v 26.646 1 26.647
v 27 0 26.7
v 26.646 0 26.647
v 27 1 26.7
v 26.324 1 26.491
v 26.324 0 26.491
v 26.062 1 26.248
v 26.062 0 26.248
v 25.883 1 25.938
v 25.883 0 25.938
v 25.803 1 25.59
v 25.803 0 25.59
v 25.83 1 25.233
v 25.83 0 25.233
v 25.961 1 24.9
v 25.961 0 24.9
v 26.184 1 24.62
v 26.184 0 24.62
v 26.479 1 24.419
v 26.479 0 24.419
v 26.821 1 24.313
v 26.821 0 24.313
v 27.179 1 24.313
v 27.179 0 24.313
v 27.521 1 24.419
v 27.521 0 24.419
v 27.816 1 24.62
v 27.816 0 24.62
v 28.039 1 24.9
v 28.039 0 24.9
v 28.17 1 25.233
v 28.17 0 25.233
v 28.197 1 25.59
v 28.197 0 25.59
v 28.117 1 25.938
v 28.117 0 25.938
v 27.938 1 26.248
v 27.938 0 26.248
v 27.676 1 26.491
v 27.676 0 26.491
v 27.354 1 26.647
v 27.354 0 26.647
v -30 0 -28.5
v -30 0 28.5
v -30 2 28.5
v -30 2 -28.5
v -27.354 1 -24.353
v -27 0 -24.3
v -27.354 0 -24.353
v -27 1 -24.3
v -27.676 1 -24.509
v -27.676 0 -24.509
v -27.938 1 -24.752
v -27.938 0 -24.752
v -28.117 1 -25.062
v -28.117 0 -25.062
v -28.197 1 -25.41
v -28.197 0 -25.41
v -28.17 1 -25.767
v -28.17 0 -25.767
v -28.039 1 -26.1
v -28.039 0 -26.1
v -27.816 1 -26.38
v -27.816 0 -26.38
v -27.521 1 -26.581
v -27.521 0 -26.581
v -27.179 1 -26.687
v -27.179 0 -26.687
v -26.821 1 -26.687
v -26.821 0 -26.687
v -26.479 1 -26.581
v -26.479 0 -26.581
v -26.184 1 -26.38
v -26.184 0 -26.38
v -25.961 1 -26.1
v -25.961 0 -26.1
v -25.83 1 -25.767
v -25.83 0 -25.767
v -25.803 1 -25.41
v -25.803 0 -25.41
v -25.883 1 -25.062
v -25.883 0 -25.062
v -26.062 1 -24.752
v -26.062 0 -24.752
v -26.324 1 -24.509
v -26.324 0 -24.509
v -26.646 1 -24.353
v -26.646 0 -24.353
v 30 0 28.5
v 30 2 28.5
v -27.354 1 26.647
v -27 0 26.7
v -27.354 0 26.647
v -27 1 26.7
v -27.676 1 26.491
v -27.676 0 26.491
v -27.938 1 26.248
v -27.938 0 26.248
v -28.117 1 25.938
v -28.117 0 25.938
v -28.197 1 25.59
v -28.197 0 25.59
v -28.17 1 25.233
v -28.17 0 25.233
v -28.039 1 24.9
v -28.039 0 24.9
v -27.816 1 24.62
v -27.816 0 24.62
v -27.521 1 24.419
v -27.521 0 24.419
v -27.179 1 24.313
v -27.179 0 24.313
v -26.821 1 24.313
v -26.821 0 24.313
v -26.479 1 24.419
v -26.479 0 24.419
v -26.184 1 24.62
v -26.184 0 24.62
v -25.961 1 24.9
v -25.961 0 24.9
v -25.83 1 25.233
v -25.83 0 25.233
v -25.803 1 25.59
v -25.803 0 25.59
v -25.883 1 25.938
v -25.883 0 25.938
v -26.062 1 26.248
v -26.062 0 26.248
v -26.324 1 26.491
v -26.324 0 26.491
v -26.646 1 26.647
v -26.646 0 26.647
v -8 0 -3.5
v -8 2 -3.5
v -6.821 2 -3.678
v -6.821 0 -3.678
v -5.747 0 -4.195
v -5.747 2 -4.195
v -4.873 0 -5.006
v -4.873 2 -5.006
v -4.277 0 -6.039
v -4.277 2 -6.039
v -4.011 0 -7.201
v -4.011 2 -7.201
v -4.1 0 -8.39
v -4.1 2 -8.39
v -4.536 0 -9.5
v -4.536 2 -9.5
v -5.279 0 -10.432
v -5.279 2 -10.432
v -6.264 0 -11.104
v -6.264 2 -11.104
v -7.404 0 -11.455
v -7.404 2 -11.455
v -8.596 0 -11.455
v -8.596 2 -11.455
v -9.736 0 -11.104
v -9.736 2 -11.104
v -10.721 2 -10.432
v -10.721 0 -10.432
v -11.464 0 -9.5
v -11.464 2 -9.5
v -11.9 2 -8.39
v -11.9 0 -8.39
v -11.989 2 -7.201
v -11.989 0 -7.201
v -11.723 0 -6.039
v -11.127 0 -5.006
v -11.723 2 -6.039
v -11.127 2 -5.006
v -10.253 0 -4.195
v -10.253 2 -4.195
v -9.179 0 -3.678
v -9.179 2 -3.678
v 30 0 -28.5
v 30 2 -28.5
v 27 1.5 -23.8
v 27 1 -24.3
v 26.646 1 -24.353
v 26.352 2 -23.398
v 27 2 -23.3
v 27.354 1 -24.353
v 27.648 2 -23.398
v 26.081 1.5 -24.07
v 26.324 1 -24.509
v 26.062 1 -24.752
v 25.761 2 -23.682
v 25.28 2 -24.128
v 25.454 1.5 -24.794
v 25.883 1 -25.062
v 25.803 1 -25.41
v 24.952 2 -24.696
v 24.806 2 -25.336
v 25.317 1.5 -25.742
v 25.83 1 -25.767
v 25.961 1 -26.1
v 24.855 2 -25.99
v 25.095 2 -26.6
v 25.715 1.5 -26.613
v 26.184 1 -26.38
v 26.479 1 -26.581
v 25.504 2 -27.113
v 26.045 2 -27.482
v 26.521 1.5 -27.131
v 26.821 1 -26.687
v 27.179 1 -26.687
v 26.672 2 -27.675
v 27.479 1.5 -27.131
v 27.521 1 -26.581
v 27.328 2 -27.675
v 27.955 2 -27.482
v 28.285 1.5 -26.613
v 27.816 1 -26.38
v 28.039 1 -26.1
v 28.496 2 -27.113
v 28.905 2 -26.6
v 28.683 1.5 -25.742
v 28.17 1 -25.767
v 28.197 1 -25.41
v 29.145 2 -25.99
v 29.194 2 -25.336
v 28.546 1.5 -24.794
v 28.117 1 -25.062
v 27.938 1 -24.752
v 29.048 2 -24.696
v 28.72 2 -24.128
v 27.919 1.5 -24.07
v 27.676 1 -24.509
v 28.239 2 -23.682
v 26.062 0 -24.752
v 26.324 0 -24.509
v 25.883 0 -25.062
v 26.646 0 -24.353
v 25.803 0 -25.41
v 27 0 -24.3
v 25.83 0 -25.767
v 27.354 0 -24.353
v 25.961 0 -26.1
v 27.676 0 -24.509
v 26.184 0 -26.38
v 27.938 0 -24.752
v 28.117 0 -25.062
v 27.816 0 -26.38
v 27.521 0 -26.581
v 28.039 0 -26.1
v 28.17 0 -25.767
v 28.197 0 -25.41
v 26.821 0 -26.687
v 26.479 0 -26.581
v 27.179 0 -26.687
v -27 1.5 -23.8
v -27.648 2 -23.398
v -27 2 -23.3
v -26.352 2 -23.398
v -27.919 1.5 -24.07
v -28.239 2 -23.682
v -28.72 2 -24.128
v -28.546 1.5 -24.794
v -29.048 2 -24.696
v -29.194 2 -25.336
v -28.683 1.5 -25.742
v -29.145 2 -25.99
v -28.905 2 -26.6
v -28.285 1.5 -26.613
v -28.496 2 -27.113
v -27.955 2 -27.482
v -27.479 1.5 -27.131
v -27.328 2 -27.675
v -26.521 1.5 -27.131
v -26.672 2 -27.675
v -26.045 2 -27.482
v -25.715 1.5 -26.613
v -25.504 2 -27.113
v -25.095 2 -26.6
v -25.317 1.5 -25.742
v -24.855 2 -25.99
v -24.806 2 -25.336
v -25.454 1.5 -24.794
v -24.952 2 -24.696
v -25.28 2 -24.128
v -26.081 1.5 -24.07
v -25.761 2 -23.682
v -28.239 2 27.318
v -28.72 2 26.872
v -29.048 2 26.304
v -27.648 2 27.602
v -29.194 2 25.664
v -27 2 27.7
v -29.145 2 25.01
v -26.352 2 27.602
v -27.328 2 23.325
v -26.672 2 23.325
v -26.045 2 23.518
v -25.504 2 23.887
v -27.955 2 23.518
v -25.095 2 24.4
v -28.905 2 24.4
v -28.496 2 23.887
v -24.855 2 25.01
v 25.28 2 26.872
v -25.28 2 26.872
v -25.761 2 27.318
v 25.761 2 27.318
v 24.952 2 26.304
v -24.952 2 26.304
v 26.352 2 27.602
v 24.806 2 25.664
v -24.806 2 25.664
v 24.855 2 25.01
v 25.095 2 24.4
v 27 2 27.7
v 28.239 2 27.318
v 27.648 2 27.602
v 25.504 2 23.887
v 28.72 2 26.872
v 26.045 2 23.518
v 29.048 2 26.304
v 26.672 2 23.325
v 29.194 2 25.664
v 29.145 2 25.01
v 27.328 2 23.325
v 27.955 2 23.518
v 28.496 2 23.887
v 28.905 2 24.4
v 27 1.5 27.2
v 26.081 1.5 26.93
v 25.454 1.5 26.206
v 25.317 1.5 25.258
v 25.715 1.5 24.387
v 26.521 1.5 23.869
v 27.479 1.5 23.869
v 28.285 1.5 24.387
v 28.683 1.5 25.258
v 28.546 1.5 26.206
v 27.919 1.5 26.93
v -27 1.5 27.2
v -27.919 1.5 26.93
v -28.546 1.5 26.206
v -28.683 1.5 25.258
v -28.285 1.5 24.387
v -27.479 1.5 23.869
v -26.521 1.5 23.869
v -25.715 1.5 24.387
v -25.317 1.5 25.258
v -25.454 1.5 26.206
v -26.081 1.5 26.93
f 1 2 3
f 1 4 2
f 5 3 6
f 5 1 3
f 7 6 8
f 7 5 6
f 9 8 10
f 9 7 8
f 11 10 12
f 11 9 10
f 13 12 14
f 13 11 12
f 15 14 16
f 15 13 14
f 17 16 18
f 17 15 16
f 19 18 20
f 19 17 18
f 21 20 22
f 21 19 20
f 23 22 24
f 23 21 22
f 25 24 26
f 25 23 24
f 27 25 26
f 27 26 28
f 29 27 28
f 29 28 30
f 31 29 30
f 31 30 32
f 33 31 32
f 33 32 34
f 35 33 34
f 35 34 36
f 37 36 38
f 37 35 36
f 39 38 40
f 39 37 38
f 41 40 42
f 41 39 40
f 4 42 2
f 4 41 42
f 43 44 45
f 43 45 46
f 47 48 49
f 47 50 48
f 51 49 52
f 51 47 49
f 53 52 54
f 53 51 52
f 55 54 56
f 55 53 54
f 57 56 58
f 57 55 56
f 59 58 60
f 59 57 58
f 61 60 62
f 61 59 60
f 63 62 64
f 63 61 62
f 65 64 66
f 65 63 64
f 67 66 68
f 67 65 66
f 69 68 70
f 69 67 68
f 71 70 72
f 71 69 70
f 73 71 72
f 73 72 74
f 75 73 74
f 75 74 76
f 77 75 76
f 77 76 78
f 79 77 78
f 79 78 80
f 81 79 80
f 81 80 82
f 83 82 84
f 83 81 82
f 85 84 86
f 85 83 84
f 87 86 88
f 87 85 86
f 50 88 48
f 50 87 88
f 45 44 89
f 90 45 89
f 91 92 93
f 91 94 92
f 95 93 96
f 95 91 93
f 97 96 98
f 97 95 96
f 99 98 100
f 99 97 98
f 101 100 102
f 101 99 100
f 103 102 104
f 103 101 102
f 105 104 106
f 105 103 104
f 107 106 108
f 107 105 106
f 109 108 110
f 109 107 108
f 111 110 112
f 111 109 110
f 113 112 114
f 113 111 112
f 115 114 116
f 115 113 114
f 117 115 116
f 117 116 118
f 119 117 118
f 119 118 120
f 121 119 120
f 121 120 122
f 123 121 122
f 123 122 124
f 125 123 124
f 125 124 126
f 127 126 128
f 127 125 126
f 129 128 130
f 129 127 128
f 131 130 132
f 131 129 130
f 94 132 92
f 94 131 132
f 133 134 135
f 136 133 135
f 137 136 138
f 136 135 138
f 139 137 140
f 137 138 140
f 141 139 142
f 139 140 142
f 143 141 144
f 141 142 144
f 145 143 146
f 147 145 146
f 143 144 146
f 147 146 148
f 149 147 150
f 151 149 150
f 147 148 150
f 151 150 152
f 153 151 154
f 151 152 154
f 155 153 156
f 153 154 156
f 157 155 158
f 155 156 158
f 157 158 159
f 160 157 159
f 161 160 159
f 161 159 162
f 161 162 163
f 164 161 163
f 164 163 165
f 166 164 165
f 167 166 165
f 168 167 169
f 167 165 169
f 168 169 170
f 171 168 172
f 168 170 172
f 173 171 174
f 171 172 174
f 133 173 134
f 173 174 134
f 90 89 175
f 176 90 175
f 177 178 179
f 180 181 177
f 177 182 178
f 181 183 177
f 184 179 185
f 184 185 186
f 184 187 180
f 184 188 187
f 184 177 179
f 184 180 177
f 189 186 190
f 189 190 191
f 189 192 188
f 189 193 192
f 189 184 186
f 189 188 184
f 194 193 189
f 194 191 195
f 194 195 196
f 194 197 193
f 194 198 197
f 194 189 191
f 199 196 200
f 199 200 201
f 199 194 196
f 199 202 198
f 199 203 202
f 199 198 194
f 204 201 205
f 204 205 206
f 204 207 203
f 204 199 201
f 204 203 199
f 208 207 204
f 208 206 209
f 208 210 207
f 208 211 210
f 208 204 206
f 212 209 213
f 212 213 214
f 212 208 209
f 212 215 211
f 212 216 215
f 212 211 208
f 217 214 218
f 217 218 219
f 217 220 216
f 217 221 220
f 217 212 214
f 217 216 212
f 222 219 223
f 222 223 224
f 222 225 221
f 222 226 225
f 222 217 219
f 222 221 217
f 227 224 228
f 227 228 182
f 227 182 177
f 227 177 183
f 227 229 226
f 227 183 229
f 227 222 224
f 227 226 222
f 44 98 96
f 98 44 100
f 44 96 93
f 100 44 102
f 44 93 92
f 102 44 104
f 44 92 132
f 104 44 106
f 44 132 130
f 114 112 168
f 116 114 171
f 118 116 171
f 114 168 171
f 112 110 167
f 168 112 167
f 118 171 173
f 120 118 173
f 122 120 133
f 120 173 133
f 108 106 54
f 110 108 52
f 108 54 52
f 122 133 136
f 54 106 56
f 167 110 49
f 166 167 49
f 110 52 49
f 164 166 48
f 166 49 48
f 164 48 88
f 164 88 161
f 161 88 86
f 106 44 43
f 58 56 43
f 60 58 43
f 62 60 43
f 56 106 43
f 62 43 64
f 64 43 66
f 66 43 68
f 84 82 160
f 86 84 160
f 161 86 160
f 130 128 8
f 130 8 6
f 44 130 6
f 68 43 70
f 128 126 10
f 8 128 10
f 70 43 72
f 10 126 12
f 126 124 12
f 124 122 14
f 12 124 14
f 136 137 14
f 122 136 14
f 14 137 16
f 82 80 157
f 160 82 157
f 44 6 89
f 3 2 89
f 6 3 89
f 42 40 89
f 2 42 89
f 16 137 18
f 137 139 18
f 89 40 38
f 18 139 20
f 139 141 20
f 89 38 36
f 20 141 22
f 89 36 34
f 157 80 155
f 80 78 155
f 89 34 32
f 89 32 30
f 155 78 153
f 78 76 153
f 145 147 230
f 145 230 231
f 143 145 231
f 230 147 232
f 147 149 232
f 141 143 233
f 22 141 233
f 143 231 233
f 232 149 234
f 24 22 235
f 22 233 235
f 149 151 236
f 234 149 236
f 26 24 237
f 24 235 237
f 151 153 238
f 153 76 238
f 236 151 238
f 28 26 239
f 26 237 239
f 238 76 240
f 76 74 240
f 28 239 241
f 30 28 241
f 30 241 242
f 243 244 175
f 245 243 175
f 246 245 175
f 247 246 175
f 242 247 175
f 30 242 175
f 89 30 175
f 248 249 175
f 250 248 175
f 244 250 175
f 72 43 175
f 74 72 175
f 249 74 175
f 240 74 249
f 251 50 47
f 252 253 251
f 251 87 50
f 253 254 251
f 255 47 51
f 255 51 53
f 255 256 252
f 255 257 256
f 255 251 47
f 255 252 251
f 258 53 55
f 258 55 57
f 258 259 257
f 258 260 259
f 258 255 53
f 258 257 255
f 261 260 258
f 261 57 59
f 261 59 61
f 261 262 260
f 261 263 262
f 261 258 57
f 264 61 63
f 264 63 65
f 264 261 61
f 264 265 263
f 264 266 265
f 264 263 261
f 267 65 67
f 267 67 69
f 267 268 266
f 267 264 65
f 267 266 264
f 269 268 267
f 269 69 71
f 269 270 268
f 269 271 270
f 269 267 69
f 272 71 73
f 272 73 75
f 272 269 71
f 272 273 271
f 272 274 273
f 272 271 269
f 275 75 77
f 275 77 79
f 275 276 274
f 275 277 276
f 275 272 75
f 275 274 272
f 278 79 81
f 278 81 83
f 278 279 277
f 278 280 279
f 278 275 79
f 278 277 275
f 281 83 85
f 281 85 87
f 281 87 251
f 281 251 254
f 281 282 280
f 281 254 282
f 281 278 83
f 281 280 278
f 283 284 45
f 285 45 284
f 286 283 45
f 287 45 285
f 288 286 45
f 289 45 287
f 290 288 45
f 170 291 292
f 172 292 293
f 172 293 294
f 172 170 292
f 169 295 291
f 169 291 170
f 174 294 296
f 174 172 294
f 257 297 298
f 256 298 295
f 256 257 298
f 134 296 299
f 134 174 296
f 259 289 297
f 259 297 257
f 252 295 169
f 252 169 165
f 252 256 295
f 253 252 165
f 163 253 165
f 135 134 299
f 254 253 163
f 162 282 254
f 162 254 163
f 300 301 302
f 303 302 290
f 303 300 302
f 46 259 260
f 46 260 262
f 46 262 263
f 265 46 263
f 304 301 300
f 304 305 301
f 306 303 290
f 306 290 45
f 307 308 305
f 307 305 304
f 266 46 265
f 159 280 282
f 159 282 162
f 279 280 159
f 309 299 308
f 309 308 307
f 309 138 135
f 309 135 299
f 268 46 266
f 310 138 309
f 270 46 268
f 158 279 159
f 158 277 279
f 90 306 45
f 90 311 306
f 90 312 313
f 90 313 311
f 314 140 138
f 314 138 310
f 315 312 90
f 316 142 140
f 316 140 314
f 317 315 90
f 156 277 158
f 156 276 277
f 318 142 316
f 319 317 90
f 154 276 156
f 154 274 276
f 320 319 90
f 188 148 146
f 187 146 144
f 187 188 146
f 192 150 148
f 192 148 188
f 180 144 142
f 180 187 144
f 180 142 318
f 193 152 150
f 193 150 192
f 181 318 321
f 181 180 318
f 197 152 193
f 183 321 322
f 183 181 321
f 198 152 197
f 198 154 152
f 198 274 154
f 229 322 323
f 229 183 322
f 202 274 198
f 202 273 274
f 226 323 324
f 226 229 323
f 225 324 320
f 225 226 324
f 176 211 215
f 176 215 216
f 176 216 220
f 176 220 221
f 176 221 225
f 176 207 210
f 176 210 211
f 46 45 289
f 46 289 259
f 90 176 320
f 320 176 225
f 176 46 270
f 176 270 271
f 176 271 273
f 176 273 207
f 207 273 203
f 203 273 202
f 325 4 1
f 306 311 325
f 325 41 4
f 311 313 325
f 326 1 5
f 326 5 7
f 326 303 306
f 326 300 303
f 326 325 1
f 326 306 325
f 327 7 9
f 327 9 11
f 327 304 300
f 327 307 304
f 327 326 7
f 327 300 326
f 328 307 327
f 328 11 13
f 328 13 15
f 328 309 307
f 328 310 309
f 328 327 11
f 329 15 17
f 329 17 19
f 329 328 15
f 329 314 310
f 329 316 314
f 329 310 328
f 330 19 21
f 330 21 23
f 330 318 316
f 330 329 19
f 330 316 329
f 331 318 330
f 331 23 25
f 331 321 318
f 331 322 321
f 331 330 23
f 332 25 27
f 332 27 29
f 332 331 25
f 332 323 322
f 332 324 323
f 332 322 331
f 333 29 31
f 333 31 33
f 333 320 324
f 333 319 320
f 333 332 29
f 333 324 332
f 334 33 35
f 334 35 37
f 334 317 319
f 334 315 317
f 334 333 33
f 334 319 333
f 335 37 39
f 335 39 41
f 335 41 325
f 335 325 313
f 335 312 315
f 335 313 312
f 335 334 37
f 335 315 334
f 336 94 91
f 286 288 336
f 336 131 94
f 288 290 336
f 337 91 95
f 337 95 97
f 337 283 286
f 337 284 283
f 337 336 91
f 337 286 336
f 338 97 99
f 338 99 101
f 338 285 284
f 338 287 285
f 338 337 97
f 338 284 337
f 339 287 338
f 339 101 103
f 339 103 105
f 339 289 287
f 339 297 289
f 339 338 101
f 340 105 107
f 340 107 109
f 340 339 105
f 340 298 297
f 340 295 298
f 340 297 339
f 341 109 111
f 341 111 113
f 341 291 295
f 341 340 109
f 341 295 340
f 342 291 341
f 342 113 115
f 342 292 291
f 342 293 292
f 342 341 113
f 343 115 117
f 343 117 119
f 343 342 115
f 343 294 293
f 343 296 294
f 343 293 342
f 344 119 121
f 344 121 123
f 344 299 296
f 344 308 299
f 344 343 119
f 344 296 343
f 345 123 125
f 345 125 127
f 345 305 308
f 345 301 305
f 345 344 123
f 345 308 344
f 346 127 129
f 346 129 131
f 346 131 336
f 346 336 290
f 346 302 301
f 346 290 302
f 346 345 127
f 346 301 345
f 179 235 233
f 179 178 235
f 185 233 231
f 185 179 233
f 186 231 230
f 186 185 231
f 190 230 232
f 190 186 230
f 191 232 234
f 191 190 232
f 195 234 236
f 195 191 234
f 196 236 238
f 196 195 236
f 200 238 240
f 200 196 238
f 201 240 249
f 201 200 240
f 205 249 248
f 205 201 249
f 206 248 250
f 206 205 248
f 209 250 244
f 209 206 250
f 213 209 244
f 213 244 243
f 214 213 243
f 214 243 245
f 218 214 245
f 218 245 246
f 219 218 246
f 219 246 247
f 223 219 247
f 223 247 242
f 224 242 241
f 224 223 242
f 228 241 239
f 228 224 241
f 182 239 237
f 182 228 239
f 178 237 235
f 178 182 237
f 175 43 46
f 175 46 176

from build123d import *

# Parameters (mm, degrees)
SKETCH1_W                                    = 60
SKETCH1_H                                    = 57
BOSS_EXTRUDE1_DEPTH                          = 2
CSK_FOR_M2_COUNTERSUNK_FLAT_HEAD_SCR_2_COUNT = 2
CSK_FOR_M2_COUNTERSUNK_FLAT_HEAD_SCR_2_PITCH = 54
CSK_FOR_M2_COUNTERSUNK_FLAT_HEAD_SCR_3_COUNT = 2
CSK_FOR_M2_COUNTERSUNK_FLAT_HEAD_SCR_3_PITCH = 74.276510419
CSK_FOR_M2_COUNTERSUNK_FLAT_HEAD_SCR_4_COUNT = 2
CSK_FOR_M2_COUNTERSUNK_FLAT_HEAD_SCR_4_PITCH = 51
SKETCH4_R                                    = 4
CUT_EXTRUDE1_DEPTH                           = 2


with BuildPart() as part:
    # Sketch1 → Boss-Extrude1 (new body)
    with BuildSketch(Plane(origin=(0, 0, 0), x_dir=(1, 0, 0), z_dir=(0, 1, 0))):
        Rectangle(SKETCH1_W, SKETCH1_H)
    extrude(amount=BOSS_EXTRUDE1_DEPTH)

    # Sketch3 → CSK for M2 Countersunk Flat Head Screw1 (revolve, cut)
    with BuildSketch(Plane(origin=(-27, 2, -25.5), x_dir=(0, 0, 1), z_dir=(1, 0, 0))):
        Polygon((0, 0), (0, 2), (1.2, 2), (1.2, 1), (2.2, 0), align=None)
    csk_for_m2_countersunk_flat_head_screw1 = revolve(axis=Axis((-27, 8.35, -25.5), (0, -1, 0)), mode=Mode.SUBTRACT)

    # CSK for M2 Countersunk Flat Head Scr 2: CSK for M2 Countersunk Flat Head Screw1 ×2
    with Locations(*[(i * CSK_FOR_M2_COUNTERSUNK_FLAT_HEAD_SCR_2_PITCH, 0, 0) for i in range(1, CSK_FOR_M2_COUNTERSUNK_FLAT_HEAD_SCR_2_COUNT)]):
        add(csk_for_m2_countersunk_flat_head_screw1, mode=Mode.SUBTRACT)

    # CSK for M2 Countersunk Flat Head Scr 3: CSK for M2 Countersunk Flat Head Screw1 ×2
    with Locations(*[Vector(0.7270131525498175, 0, 0.6866235329637166) * (i * CSK_FOR_M2_COUNTERSUNK_FLAT_HEAD_SCR_3_PITCH) for i in range(1, CSK_FOR_M2_COUNTERSUNK_FLAT_HEAD_SCR_3_COUNT)]):
        add(csk_for_m2_countersunk_flat_head_screw1, mode=Mode.SUBTRACT)

    # CSK for M2 Countersunk Flat Head Scr 4: CSK for M2 Countersunk Flat Head Screw1 ×2
    with Locations(*[(0, 0, i * CSK_FOR_M2_COUNTERSUNK_FLAT_HEAD_SCR_4_PITCH) for i in range(1, CSK_FOR_M2_COUNTERSUNK_FLAT_HEAD_SCR_4_COUNT)]):
        add(csk_for_m2_countersunk_flat_head_screw1, mode=Mode.SUBTRACT)

    # Sketch4 → Cut-Extrude1 (cut)
    with BuildSketch(Plane(origin=(0, 2, 0), x_dir=(1, 0, 0), z_dir=(0, 1, 0))):
        with Locations(Location((-8, 7.5, 0), (0, 0, 270))):
            Circle(SKETCH4_R)
    extrude(amount=-CUT_EXTRUDE1_DEPTH, mode=Mode.SUBTRACT)


solid = part.part
